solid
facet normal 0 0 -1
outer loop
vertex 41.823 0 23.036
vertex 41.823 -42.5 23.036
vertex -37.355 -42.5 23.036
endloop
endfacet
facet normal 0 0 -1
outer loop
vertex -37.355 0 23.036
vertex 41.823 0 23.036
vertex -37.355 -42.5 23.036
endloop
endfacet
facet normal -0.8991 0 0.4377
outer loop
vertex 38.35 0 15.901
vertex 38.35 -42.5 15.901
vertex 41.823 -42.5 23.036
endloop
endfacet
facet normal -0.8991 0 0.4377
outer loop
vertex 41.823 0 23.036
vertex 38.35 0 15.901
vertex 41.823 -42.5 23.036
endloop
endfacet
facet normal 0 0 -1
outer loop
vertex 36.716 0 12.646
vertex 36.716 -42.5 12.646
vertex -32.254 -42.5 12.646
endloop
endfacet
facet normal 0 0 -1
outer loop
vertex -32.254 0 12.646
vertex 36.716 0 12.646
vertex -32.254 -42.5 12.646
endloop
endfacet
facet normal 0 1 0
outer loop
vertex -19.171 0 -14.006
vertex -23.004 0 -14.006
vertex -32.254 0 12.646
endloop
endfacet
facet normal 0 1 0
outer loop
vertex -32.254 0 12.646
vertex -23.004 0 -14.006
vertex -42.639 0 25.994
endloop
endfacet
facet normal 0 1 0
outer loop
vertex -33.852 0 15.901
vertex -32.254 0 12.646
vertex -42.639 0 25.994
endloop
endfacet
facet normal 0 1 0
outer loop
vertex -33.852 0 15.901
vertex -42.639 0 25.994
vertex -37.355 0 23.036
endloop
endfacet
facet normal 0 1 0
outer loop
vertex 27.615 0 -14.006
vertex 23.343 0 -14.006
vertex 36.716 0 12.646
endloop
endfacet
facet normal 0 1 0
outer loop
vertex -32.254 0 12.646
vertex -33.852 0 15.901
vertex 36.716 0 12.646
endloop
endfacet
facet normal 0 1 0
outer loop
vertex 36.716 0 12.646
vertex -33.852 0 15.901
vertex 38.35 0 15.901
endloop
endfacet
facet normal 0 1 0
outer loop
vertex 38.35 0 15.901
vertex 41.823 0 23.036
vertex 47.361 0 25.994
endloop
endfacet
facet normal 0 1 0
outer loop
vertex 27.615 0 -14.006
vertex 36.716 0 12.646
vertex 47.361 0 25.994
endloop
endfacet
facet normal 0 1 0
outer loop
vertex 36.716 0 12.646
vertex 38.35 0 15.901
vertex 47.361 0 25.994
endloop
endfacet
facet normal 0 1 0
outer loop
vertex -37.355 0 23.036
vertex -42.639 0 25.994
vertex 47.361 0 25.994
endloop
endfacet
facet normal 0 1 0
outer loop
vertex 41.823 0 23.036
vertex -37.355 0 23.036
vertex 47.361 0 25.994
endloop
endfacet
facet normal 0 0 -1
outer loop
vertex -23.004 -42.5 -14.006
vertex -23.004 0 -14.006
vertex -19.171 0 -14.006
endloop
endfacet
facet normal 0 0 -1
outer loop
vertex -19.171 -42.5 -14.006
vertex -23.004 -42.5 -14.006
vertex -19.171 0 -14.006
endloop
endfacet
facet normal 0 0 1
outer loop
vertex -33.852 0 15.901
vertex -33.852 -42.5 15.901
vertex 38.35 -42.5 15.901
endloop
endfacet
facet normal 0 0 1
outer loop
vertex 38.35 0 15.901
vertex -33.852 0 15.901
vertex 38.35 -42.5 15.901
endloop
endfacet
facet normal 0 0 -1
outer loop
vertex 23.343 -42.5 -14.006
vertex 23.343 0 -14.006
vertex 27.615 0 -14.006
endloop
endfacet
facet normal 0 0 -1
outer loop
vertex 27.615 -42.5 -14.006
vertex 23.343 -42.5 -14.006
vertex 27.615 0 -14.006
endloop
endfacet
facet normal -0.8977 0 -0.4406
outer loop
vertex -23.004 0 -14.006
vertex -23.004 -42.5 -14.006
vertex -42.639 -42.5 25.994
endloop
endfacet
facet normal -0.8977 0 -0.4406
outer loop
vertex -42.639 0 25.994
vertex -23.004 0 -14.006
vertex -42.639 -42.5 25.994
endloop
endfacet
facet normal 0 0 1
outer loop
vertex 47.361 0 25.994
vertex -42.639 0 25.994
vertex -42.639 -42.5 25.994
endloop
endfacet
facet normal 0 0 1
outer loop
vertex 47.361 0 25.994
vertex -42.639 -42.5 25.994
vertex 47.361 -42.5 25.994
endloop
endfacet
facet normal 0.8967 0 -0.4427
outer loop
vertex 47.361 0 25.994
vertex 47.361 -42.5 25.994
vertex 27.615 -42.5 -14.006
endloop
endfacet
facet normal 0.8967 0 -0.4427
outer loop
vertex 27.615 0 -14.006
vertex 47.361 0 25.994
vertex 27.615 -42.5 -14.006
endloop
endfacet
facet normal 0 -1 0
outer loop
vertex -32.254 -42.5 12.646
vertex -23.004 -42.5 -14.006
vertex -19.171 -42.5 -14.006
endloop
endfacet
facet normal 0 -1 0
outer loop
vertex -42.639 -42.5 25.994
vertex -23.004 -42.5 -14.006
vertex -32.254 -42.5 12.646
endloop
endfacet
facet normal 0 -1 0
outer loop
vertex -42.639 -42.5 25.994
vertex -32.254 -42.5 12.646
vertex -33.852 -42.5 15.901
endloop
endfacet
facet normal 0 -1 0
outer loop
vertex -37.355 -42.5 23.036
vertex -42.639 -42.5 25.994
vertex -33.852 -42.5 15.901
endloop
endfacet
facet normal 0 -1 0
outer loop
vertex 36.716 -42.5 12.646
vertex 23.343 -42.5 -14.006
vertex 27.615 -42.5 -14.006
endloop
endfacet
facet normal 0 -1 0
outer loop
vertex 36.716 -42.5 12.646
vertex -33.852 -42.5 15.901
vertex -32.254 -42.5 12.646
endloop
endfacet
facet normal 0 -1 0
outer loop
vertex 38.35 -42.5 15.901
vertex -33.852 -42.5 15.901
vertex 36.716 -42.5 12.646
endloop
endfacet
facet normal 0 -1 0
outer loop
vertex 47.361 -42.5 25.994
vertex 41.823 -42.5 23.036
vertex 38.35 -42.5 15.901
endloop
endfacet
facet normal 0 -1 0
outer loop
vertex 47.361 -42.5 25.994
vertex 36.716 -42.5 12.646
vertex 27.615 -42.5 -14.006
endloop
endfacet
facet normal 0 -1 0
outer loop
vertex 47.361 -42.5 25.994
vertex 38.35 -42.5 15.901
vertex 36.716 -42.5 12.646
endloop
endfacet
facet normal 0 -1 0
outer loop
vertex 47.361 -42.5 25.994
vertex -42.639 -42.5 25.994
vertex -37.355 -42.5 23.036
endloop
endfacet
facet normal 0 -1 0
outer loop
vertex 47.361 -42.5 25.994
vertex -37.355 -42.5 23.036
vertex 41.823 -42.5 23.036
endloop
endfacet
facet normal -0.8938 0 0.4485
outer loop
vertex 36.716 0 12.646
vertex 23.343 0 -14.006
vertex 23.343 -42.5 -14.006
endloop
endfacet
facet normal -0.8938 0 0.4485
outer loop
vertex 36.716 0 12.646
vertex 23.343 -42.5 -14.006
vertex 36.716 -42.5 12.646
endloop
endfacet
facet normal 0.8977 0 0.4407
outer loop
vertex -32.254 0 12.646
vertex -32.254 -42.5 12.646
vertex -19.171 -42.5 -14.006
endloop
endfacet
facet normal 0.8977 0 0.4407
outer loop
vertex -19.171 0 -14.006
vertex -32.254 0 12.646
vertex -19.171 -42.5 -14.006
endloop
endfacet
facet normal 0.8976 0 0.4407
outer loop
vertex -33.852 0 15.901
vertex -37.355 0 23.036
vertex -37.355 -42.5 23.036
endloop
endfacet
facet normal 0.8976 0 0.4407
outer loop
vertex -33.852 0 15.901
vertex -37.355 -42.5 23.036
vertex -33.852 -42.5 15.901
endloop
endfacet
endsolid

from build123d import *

# Parameters (mm, degrees)
F0_W     = 180
F0_H     = 80
F1_DEPTH = 85
F3_DEPTH = 85.001
F5_DEPTH = 85.001
F6_SCALE = 0.5


with BuildPart() as f1:
    # F0 (on Front) → F1 (new body)
    with BuildSketch(Plane.XZ):
        with Locations((4.7223418951, 11.9884983084)):
            Rectangle(F0_W, F0_H)
    extrude(amount=F1_DEPTH)

    # F2 (on face) → F3 (cut, through all)
    with BuildSketch(Plane.XZ.offset(85)):
        Polygon((-46.0070036352, -28.0115016916), (-85.2776581049, 51.9884983084), (-85.2776581049, -28.0115016916), align=None)
        Polygon((94.7223418951, -28.0115016916), (94.7223418951, 51.9884983084), (55.2294403315, -28.0115016916), align=None)
    extrude(amount=-F3_DEPTH, mode=Mode.SUBTRACT)

    # F4 (on face) → F5 (cut, through all)
    with BuildSketch(Plane.XZ.offset(85)):
        Polygon((-74.7092828557, 46.072713804), (-67.7043439121, 31.8026405634), (76.6995772719, 31.8026405634), (83.6467270564, 46.072713804), align=None)
        Polygon((73.4329734772, 25.2924152588), (-64.5085838063, 25.2924152588), (-38.3425875008, -28.0115016916), (46.6869287193, -28.0115016916), align=None)
    extrude(amount=-F5_DEPTH, mode=Mode.SUBTRACT)


with BuildPart() as f1_1:
    # F6: moved
    add(f1.part.scale(F6_SCALE))


solid = f1_1.part
